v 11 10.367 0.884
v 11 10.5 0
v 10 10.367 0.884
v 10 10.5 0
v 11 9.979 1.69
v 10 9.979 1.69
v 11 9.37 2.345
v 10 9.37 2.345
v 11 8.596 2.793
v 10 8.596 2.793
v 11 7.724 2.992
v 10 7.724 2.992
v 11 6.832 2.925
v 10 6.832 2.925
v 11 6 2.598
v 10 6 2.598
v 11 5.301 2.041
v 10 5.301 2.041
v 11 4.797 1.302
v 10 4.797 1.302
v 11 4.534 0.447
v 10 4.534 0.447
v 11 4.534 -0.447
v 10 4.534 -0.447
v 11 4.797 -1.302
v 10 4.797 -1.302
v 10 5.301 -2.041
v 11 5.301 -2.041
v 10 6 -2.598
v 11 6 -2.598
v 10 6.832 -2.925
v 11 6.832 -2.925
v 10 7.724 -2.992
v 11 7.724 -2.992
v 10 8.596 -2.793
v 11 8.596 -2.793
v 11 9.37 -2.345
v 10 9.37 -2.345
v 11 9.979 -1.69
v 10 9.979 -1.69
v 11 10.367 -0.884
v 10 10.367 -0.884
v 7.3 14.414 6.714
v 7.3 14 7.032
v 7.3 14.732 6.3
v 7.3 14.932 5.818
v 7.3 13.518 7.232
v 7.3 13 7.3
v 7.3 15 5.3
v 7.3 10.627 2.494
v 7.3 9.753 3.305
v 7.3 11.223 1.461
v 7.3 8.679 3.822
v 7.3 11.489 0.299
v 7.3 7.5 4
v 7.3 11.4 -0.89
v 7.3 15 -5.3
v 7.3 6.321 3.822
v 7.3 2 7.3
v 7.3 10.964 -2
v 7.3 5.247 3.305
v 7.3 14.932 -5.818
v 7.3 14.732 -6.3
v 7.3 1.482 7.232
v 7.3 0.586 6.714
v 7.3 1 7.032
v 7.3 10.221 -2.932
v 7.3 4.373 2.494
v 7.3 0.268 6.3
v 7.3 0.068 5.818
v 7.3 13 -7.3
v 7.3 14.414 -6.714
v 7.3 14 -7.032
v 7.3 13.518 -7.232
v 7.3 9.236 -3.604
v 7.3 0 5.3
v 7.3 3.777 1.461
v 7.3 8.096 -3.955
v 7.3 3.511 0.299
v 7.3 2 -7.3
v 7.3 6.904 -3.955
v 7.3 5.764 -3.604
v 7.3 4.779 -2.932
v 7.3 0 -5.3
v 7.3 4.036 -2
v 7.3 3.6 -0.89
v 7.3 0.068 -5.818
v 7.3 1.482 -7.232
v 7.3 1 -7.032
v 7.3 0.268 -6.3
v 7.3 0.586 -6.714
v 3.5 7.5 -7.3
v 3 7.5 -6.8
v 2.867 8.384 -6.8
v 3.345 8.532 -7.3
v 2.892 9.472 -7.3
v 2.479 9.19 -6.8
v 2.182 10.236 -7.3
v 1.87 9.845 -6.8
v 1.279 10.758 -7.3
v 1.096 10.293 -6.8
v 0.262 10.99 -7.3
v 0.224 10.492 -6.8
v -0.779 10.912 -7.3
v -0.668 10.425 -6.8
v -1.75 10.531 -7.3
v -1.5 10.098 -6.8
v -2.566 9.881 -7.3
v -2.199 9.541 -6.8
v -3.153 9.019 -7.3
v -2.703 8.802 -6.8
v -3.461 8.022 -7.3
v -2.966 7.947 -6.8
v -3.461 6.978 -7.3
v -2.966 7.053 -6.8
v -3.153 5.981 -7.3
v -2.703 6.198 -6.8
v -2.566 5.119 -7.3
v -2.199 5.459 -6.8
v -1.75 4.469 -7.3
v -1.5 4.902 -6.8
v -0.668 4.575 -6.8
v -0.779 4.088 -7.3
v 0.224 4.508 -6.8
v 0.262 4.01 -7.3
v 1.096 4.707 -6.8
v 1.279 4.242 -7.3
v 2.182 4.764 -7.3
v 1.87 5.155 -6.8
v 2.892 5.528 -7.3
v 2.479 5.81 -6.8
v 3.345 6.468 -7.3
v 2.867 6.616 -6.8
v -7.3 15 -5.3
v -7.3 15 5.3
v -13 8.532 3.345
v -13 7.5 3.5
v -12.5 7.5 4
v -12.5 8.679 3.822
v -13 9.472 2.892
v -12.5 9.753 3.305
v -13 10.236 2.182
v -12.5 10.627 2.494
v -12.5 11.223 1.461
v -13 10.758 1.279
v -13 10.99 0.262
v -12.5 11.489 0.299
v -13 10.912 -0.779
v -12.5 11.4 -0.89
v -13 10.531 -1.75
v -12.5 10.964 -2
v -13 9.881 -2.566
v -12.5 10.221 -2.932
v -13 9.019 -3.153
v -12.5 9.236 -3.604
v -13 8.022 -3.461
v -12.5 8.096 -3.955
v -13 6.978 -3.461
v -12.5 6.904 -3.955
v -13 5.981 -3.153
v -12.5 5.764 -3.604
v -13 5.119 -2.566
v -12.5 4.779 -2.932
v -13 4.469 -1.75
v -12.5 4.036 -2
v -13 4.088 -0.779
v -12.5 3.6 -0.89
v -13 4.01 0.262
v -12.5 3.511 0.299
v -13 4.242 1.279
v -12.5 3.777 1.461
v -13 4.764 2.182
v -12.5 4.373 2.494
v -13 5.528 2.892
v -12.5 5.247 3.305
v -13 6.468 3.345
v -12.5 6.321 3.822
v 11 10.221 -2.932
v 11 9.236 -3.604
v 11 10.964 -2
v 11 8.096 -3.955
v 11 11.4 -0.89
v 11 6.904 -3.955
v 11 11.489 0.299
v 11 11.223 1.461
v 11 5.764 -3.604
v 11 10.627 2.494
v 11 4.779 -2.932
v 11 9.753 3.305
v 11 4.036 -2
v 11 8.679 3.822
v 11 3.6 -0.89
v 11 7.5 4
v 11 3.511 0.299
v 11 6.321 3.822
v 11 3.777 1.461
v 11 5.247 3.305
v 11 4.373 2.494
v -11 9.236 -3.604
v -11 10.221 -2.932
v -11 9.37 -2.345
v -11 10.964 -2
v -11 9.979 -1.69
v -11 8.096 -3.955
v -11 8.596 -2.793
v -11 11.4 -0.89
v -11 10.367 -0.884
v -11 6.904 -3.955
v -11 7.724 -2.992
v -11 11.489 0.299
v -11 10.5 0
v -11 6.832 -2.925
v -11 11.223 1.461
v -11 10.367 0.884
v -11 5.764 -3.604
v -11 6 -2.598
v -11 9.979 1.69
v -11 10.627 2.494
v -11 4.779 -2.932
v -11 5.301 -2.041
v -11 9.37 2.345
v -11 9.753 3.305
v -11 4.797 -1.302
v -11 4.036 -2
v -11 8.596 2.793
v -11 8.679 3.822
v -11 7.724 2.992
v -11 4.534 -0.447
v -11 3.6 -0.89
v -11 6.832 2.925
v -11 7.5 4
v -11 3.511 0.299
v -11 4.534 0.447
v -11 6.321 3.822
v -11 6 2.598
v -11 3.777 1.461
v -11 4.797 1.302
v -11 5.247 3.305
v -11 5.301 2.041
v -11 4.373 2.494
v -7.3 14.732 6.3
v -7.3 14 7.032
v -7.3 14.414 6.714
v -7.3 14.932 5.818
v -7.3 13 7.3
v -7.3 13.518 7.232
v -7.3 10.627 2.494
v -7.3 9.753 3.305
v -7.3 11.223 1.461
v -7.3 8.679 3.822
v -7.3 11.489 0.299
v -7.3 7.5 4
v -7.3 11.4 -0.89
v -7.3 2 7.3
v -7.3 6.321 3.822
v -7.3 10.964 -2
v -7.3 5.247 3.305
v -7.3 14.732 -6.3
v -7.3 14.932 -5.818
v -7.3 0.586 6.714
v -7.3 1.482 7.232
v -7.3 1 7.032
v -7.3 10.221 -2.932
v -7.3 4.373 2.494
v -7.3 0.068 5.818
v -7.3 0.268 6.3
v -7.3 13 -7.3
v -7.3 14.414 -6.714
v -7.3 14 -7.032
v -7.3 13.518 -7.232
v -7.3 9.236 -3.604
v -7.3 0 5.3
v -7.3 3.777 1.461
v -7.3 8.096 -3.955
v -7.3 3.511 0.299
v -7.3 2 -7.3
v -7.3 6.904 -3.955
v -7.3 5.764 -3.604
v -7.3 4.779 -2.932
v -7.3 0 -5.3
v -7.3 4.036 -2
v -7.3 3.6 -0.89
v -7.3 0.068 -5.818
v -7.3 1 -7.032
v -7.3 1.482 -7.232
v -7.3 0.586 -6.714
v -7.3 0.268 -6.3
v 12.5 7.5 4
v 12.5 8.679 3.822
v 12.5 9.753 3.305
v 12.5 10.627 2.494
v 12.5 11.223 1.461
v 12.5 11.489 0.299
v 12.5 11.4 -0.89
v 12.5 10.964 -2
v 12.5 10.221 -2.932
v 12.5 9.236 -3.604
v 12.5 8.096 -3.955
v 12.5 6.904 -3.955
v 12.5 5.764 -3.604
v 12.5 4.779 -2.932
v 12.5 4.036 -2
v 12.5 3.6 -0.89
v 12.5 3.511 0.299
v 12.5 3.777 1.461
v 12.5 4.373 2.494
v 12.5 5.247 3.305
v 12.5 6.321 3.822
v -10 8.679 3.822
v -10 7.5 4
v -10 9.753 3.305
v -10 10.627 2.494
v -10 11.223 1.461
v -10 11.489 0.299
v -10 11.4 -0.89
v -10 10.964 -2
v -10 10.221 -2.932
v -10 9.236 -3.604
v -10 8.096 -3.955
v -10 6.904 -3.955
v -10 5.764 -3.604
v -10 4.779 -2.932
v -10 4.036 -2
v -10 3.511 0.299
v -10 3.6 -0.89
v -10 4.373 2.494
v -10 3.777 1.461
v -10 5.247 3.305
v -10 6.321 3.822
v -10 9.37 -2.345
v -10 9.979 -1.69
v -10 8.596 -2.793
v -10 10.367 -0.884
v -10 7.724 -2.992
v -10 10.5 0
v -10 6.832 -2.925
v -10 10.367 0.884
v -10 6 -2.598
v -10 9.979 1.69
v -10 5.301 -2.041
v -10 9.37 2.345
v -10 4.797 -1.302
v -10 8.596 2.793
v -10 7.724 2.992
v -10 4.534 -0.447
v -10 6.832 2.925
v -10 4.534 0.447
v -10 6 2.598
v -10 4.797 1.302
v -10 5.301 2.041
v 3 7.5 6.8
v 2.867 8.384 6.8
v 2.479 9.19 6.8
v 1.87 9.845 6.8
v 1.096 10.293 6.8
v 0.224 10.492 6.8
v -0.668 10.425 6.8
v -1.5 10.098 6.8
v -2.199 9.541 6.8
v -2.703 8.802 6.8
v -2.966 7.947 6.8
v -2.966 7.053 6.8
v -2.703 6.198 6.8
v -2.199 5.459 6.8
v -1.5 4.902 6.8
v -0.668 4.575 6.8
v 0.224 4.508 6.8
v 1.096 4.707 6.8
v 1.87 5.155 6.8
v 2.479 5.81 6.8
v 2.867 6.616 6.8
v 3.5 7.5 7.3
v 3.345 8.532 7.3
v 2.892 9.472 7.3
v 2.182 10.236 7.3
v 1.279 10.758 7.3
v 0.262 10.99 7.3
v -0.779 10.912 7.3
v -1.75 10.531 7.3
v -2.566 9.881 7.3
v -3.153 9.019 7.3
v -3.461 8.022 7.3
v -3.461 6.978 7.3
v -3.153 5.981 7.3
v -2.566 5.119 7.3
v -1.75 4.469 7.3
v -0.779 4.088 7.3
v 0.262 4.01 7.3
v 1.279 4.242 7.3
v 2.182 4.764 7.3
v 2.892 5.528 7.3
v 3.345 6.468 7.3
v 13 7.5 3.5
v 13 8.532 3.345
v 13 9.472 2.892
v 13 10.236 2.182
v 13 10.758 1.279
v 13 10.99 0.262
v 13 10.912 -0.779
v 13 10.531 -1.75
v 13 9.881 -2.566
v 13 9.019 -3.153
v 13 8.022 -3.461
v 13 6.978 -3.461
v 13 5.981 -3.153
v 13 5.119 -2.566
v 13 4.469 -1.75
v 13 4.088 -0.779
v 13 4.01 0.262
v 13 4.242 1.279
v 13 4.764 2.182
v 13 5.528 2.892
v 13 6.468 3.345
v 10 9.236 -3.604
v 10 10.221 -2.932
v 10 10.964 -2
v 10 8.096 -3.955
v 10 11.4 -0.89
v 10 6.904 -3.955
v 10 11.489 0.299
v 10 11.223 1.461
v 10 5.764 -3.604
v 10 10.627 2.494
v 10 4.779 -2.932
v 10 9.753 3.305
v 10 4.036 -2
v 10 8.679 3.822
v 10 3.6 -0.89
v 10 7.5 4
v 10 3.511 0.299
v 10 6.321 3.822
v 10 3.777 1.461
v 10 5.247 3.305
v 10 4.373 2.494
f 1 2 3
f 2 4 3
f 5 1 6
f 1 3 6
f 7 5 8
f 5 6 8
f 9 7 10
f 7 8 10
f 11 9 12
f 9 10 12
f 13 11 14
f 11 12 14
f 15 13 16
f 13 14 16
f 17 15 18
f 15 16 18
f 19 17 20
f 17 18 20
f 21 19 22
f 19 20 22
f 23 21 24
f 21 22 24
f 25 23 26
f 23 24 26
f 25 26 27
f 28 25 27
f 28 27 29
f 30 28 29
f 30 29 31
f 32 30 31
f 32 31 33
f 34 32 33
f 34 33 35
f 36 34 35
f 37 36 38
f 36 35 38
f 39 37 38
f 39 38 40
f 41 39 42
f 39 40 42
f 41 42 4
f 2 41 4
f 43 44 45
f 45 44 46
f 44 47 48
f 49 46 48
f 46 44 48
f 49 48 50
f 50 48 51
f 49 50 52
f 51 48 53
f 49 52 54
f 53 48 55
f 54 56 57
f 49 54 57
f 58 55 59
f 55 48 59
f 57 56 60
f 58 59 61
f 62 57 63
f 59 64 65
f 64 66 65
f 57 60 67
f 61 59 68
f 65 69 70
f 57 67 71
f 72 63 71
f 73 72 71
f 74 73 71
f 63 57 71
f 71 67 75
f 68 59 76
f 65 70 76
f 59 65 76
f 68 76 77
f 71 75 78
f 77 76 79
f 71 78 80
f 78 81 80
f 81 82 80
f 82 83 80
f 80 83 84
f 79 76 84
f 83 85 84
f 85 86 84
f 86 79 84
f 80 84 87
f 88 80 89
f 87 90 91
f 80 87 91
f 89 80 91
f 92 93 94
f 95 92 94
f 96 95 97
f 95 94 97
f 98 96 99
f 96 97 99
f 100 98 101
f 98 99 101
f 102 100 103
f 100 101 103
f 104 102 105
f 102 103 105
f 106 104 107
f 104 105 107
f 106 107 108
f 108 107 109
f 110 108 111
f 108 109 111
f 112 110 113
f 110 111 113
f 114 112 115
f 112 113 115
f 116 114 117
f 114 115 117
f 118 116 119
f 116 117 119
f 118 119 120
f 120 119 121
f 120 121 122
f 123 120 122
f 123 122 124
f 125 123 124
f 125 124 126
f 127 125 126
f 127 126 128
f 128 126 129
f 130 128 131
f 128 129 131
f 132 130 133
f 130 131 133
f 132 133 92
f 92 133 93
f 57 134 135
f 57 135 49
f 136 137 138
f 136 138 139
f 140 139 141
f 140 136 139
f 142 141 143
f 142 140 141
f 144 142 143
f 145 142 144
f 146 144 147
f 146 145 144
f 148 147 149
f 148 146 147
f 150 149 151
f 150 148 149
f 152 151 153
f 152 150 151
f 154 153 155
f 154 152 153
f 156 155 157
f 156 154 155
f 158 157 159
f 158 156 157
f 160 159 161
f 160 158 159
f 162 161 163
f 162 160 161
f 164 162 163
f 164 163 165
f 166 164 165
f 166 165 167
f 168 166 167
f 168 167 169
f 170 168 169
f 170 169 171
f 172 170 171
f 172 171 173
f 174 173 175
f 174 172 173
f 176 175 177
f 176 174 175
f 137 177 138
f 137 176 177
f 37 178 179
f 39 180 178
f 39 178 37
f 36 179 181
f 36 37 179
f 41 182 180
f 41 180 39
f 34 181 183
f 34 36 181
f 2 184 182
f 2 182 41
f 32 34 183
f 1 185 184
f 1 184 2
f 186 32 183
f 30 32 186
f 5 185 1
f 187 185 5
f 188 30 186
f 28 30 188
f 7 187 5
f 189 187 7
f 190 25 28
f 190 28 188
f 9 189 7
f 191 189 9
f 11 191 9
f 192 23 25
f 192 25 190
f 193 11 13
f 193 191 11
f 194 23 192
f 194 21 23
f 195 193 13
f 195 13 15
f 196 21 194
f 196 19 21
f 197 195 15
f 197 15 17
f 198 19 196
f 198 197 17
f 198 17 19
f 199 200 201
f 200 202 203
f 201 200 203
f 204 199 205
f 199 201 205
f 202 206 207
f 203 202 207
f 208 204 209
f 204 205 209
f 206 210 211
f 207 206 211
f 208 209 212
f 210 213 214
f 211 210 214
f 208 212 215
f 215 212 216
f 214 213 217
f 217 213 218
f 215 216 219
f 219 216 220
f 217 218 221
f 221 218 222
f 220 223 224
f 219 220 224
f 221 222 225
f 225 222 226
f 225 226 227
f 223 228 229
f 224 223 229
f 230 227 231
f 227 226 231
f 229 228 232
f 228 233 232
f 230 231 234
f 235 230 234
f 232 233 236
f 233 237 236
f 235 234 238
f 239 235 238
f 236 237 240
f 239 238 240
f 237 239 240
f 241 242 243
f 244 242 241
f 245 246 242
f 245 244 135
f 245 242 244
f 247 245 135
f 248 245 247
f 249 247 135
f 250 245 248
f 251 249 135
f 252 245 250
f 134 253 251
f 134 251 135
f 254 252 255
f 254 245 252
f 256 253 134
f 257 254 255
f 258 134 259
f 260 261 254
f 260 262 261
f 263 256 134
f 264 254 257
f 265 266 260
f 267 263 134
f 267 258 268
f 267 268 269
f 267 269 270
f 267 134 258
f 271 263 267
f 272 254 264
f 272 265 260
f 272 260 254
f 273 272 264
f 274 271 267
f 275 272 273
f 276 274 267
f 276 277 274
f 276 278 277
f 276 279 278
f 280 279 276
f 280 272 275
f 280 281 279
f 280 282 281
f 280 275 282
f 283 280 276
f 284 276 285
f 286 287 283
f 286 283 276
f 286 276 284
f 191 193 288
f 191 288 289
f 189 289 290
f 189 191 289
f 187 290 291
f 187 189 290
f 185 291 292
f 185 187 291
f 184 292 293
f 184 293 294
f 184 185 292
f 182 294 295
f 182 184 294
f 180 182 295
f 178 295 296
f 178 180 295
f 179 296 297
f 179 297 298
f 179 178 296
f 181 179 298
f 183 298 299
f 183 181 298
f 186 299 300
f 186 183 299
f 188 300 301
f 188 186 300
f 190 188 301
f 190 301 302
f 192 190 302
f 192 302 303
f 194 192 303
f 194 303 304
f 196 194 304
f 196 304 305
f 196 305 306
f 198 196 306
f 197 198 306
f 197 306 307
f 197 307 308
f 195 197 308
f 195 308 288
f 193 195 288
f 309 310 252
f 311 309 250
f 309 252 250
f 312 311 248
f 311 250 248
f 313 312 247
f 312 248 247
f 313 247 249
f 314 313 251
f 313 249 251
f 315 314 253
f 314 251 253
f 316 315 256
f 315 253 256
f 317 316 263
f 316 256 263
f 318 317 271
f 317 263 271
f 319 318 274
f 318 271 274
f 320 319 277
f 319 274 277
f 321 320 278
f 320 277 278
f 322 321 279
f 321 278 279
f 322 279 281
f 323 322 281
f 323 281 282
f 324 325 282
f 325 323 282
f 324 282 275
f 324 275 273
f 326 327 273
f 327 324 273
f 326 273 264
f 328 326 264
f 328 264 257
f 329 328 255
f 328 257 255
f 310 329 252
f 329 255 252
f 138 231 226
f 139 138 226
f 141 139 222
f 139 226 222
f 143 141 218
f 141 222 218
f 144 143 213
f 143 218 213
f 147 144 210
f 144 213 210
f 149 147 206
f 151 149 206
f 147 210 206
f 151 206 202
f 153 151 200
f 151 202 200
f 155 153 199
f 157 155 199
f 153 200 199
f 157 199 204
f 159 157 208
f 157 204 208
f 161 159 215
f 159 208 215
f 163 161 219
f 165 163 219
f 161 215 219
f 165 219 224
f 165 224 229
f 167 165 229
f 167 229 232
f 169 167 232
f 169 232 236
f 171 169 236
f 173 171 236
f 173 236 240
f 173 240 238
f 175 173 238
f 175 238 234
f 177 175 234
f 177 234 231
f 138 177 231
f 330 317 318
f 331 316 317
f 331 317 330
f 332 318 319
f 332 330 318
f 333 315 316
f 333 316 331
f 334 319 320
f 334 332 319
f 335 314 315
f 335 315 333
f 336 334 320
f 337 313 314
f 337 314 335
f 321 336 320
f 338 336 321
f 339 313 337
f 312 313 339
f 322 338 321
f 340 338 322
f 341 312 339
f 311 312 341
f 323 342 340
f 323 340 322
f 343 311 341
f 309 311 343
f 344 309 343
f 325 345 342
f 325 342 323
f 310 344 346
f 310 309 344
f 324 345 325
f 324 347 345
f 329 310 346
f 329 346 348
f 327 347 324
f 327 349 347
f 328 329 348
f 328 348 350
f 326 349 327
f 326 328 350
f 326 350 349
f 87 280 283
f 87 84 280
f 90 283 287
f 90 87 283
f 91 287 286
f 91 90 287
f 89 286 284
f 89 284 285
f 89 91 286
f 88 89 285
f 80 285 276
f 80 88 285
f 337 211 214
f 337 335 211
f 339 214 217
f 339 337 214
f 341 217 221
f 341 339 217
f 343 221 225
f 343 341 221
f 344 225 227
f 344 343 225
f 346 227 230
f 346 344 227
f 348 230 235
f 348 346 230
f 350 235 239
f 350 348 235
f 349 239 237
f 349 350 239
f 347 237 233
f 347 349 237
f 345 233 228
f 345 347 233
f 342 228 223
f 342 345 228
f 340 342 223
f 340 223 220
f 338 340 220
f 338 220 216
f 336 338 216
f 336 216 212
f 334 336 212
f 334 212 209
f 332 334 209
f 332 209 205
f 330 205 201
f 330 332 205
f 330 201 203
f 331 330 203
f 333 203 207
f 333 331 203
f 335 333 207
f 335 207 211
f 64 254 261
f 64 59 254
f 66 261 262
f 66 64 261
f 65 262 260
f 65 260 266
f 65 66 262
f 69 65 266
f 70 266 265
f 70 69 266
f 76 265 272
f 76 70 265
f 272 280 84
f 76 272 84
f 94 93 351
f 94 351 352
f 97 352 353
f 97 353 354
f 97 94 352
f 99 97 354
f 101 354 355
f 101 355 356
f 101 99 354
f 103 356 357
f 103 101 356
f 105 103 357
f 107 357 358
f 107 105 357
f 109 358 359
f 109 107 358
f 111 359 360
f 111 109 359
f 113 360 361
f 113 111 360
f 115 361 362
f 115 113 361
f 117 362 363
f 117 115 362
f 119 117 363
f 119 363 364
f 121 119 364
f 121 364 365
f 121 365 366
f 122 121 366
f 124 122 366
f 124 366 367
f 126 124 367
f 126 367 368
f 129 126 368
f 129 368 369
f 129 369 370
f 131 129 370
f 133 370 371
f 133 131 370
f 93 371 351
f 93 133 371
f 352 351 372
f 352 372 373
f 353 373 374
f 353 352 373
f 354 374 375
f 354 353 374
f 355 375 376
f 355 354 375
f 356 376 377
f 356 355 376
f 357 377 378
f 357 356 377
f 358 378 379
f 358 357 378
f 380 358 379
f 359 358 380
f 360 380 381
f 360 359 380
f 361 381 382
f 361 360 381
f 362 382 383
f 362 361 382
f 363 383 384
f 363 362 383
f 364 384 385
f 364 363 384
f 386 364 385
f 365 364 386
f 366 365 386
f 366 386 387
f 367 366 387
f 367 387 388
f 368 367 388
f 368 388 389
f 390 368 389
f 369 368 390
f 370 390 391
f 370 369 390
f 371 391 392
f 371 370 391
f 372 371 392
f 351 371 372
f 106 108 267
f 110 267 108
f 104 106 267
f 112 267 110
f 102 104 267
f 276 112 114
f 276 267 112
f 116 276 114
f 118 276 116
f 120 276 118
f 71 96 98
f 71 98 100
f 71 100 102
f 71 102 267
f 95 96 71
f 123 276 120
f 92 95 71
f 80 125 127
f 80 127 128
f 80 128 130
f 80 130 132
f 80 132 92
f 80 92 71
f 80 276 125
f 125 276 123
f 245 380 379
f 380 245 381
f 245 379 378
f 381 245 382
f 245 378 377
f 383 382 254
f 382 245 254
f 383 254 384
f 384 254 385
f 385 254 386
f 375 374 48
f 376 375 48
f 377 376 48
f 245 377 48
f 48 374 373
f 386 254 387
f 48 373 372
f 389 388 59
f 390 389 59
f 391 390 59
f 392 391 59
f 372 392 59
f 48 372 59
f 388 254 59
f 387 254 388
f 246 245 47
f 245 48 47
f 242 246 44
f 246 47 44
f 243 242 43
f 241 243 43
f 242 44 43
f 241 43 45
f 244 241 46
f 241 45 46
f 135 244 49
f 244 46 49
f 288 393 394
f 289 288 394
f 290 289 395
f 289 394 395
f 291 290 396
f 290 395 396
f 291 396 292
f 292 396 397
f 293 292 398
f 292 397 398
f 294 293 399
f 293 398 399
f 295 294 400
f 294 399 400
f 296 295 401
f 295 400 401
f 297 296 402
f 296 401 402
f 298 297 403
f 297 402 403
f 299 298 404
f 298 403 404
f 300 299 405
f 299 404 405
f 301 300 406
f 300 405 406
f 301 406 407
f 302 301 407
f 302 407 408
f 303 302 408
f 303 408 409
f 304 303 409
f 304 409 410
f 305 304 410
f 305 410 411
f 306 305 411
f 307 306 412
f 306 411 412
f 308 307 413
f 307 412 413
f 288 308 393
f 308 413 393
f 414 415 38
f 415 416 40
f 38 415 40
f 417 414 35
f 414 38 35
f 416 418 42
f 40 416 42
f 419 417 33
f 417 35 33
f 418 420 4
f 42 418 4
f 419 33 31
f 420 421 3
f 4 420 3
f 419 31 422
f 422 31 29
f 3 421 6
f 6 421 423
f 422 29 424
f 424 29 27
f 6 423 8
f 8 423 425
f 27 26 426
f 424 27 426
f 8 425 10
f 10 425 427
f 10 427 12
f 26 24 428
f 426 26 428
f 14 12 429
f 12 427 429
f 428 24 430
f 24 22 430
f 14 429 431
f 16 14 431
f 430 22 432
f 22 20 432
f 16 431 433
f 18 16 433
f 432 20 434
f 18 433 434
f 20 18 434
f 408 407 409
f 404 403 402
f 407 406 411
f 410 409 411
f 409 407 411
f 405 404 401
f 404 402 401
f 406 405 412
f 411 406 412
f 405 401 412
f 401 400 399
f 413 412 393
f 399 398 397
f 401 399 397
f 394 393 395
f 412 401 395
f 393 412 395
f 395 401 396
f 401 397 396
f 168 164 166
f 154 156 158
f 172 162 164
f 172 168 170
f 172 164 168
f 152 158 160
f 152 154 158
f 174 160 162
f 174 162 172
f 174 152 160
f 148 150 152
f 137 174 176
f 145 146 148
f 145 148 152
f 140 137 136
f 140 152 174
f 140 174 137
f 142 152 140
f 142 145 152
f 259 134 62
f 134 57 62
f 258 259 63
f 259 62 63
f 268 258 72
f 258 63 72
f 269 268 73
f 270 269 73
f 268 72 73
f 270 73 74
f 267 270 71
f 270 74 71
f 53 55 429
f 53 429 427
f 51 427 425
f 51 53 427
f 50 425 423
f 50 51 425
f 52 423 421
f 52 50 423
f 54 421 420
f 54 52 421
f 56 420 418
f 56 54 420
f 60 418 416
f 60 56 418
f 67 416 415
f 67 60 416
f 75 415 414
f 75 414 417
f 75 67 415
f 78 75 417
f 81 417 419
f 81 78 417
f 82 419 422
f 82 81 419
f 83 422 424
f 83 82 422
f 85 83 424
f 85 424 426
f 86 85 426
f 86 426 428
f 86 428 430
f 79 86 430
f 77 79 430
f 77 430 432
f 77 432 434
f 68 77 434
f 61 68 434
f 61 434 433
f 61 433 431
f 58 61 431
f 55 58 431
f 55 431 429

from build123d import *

# Parameters (mm, degrees)
SKETCH1_W                = 14.6
SKETCH1_H                = 14.6
BOSS_EXTRUDE1_DEPTH      = 15
SKETCH2_R                = 3
CUT_EXTRUDE1_DEPTH       = 14.6
CHAMFER1_SIZE            = 0.5
SKETCH3_R                = 4
BOSS_EXTRUDE2_DEPTH      = 5.7
SKETCH4_W                = 1
SKETCH4_H                = 1.778268535
CHAMFER2_SIZE            = 0.5
CHAMFER2_OF_MIRROR1_SIZE = 0.5
FILLET1_R                = 2


with BuildPart() as part:
    # Sketch1 → Boss-Extrude1 (new body)
    with BuildSketch(Plane(origin=(0, 0, 0), x_dir=(1, 0, 0), z_dir=(0, 1, 0))):
        Rectangle(SKETCH1_W, SKETCH1_H)
    extrude(amount=BOSS_EXTRUDE1_DEPTH)

    # Sketch2 → Cut-Extrude1 (cut)
    with BuildSketch(Plane(origin=(0, 7.7, -7.3), x_dir=(1, 0, 0), z_dir=(0, 0, 1))):
        with Locations((0, -0.2)):
            Circle(SKETCH2_R)
    extrude(amount=CUT_EXTRUDE1_DEPTH, mode=Mode.SUBTRACT)

    # Chamfer1
    chamfer1_edges = [part.edges().sort_by_distance(p)[0] for p in [
        (-3, 7.5, -7.3),
        (-3, 7.5, 7.3),
    ]]
    chamfer(chamfer1_edges, length=CHAMFER1_SIZE)

    # Sketch3 → Boss-Extrude2 (add)
    with BuildSketch(Plane.ZY.offset(7.3)):
        with Locations((0, 7.5)):
            Circle(SKETCH3_R)
    boss_extrude2 = extrude(amount=BOSS_EXTRUDE2_DEPTH)

    # Sketch4 → Cut-Revolve1 (revolve, cut)
    with BuildSketch(Plane.XY):
        with Locations((-10.5, 11.389134268)):
            Rectangle(SKETCH4_W, SKETCH4_H)
    cut_revolve1 = revolve(axis=Axis((-13, 7.5, 0), (1, 0, 0)), mode=Mode.SUBTRACT)

    # Chamfer2
    chamfer2_edges = [part.edges().sort_by_distance(p)[0] for p in [
        (-13, 7.5, -4),
    ]]
    chamfer(chamfer2_edges, length=CHAMFER2_SIZE)

    # Mirror1: Boss-Extrude2, Cut-Revolve1 across plane
    add(boss_extrude2.mirror(Plane(origin=(0, 0, 0), x_dir=(0, 0, 1), z_dir=(1, 0, 0))))
    add(cut_revolve1.mirror(Plane(origin=(0, 0, 0), x_dir=(0, 0, 1), z_dir=(1, 0, 0))), mode=Mode.SUBTRACT)

    # Chamfer2 of Mirror1
    chamfer2_of_mirror1_edges = [part.edges().sort_by_distance(p)[0] for p in [
        (13, 7.5, -4),
    ]]
    chamfer(chamfer2_of_mirror1_edges, length=CHAMFER2_OF_MIRROR1_SIZE)

    # Fillet1
    fillet1_edges = [part.edges().sort_by_distance(p)[0] for p in [
        (0, 15, -7.3),
        (0, 0, -7.3),
        (0, 0, 7.3),
        (0, 15, 7.3),
    ]]
    fillet(fillet1_edges, radius=FILLET1_R)


solid = part.part
